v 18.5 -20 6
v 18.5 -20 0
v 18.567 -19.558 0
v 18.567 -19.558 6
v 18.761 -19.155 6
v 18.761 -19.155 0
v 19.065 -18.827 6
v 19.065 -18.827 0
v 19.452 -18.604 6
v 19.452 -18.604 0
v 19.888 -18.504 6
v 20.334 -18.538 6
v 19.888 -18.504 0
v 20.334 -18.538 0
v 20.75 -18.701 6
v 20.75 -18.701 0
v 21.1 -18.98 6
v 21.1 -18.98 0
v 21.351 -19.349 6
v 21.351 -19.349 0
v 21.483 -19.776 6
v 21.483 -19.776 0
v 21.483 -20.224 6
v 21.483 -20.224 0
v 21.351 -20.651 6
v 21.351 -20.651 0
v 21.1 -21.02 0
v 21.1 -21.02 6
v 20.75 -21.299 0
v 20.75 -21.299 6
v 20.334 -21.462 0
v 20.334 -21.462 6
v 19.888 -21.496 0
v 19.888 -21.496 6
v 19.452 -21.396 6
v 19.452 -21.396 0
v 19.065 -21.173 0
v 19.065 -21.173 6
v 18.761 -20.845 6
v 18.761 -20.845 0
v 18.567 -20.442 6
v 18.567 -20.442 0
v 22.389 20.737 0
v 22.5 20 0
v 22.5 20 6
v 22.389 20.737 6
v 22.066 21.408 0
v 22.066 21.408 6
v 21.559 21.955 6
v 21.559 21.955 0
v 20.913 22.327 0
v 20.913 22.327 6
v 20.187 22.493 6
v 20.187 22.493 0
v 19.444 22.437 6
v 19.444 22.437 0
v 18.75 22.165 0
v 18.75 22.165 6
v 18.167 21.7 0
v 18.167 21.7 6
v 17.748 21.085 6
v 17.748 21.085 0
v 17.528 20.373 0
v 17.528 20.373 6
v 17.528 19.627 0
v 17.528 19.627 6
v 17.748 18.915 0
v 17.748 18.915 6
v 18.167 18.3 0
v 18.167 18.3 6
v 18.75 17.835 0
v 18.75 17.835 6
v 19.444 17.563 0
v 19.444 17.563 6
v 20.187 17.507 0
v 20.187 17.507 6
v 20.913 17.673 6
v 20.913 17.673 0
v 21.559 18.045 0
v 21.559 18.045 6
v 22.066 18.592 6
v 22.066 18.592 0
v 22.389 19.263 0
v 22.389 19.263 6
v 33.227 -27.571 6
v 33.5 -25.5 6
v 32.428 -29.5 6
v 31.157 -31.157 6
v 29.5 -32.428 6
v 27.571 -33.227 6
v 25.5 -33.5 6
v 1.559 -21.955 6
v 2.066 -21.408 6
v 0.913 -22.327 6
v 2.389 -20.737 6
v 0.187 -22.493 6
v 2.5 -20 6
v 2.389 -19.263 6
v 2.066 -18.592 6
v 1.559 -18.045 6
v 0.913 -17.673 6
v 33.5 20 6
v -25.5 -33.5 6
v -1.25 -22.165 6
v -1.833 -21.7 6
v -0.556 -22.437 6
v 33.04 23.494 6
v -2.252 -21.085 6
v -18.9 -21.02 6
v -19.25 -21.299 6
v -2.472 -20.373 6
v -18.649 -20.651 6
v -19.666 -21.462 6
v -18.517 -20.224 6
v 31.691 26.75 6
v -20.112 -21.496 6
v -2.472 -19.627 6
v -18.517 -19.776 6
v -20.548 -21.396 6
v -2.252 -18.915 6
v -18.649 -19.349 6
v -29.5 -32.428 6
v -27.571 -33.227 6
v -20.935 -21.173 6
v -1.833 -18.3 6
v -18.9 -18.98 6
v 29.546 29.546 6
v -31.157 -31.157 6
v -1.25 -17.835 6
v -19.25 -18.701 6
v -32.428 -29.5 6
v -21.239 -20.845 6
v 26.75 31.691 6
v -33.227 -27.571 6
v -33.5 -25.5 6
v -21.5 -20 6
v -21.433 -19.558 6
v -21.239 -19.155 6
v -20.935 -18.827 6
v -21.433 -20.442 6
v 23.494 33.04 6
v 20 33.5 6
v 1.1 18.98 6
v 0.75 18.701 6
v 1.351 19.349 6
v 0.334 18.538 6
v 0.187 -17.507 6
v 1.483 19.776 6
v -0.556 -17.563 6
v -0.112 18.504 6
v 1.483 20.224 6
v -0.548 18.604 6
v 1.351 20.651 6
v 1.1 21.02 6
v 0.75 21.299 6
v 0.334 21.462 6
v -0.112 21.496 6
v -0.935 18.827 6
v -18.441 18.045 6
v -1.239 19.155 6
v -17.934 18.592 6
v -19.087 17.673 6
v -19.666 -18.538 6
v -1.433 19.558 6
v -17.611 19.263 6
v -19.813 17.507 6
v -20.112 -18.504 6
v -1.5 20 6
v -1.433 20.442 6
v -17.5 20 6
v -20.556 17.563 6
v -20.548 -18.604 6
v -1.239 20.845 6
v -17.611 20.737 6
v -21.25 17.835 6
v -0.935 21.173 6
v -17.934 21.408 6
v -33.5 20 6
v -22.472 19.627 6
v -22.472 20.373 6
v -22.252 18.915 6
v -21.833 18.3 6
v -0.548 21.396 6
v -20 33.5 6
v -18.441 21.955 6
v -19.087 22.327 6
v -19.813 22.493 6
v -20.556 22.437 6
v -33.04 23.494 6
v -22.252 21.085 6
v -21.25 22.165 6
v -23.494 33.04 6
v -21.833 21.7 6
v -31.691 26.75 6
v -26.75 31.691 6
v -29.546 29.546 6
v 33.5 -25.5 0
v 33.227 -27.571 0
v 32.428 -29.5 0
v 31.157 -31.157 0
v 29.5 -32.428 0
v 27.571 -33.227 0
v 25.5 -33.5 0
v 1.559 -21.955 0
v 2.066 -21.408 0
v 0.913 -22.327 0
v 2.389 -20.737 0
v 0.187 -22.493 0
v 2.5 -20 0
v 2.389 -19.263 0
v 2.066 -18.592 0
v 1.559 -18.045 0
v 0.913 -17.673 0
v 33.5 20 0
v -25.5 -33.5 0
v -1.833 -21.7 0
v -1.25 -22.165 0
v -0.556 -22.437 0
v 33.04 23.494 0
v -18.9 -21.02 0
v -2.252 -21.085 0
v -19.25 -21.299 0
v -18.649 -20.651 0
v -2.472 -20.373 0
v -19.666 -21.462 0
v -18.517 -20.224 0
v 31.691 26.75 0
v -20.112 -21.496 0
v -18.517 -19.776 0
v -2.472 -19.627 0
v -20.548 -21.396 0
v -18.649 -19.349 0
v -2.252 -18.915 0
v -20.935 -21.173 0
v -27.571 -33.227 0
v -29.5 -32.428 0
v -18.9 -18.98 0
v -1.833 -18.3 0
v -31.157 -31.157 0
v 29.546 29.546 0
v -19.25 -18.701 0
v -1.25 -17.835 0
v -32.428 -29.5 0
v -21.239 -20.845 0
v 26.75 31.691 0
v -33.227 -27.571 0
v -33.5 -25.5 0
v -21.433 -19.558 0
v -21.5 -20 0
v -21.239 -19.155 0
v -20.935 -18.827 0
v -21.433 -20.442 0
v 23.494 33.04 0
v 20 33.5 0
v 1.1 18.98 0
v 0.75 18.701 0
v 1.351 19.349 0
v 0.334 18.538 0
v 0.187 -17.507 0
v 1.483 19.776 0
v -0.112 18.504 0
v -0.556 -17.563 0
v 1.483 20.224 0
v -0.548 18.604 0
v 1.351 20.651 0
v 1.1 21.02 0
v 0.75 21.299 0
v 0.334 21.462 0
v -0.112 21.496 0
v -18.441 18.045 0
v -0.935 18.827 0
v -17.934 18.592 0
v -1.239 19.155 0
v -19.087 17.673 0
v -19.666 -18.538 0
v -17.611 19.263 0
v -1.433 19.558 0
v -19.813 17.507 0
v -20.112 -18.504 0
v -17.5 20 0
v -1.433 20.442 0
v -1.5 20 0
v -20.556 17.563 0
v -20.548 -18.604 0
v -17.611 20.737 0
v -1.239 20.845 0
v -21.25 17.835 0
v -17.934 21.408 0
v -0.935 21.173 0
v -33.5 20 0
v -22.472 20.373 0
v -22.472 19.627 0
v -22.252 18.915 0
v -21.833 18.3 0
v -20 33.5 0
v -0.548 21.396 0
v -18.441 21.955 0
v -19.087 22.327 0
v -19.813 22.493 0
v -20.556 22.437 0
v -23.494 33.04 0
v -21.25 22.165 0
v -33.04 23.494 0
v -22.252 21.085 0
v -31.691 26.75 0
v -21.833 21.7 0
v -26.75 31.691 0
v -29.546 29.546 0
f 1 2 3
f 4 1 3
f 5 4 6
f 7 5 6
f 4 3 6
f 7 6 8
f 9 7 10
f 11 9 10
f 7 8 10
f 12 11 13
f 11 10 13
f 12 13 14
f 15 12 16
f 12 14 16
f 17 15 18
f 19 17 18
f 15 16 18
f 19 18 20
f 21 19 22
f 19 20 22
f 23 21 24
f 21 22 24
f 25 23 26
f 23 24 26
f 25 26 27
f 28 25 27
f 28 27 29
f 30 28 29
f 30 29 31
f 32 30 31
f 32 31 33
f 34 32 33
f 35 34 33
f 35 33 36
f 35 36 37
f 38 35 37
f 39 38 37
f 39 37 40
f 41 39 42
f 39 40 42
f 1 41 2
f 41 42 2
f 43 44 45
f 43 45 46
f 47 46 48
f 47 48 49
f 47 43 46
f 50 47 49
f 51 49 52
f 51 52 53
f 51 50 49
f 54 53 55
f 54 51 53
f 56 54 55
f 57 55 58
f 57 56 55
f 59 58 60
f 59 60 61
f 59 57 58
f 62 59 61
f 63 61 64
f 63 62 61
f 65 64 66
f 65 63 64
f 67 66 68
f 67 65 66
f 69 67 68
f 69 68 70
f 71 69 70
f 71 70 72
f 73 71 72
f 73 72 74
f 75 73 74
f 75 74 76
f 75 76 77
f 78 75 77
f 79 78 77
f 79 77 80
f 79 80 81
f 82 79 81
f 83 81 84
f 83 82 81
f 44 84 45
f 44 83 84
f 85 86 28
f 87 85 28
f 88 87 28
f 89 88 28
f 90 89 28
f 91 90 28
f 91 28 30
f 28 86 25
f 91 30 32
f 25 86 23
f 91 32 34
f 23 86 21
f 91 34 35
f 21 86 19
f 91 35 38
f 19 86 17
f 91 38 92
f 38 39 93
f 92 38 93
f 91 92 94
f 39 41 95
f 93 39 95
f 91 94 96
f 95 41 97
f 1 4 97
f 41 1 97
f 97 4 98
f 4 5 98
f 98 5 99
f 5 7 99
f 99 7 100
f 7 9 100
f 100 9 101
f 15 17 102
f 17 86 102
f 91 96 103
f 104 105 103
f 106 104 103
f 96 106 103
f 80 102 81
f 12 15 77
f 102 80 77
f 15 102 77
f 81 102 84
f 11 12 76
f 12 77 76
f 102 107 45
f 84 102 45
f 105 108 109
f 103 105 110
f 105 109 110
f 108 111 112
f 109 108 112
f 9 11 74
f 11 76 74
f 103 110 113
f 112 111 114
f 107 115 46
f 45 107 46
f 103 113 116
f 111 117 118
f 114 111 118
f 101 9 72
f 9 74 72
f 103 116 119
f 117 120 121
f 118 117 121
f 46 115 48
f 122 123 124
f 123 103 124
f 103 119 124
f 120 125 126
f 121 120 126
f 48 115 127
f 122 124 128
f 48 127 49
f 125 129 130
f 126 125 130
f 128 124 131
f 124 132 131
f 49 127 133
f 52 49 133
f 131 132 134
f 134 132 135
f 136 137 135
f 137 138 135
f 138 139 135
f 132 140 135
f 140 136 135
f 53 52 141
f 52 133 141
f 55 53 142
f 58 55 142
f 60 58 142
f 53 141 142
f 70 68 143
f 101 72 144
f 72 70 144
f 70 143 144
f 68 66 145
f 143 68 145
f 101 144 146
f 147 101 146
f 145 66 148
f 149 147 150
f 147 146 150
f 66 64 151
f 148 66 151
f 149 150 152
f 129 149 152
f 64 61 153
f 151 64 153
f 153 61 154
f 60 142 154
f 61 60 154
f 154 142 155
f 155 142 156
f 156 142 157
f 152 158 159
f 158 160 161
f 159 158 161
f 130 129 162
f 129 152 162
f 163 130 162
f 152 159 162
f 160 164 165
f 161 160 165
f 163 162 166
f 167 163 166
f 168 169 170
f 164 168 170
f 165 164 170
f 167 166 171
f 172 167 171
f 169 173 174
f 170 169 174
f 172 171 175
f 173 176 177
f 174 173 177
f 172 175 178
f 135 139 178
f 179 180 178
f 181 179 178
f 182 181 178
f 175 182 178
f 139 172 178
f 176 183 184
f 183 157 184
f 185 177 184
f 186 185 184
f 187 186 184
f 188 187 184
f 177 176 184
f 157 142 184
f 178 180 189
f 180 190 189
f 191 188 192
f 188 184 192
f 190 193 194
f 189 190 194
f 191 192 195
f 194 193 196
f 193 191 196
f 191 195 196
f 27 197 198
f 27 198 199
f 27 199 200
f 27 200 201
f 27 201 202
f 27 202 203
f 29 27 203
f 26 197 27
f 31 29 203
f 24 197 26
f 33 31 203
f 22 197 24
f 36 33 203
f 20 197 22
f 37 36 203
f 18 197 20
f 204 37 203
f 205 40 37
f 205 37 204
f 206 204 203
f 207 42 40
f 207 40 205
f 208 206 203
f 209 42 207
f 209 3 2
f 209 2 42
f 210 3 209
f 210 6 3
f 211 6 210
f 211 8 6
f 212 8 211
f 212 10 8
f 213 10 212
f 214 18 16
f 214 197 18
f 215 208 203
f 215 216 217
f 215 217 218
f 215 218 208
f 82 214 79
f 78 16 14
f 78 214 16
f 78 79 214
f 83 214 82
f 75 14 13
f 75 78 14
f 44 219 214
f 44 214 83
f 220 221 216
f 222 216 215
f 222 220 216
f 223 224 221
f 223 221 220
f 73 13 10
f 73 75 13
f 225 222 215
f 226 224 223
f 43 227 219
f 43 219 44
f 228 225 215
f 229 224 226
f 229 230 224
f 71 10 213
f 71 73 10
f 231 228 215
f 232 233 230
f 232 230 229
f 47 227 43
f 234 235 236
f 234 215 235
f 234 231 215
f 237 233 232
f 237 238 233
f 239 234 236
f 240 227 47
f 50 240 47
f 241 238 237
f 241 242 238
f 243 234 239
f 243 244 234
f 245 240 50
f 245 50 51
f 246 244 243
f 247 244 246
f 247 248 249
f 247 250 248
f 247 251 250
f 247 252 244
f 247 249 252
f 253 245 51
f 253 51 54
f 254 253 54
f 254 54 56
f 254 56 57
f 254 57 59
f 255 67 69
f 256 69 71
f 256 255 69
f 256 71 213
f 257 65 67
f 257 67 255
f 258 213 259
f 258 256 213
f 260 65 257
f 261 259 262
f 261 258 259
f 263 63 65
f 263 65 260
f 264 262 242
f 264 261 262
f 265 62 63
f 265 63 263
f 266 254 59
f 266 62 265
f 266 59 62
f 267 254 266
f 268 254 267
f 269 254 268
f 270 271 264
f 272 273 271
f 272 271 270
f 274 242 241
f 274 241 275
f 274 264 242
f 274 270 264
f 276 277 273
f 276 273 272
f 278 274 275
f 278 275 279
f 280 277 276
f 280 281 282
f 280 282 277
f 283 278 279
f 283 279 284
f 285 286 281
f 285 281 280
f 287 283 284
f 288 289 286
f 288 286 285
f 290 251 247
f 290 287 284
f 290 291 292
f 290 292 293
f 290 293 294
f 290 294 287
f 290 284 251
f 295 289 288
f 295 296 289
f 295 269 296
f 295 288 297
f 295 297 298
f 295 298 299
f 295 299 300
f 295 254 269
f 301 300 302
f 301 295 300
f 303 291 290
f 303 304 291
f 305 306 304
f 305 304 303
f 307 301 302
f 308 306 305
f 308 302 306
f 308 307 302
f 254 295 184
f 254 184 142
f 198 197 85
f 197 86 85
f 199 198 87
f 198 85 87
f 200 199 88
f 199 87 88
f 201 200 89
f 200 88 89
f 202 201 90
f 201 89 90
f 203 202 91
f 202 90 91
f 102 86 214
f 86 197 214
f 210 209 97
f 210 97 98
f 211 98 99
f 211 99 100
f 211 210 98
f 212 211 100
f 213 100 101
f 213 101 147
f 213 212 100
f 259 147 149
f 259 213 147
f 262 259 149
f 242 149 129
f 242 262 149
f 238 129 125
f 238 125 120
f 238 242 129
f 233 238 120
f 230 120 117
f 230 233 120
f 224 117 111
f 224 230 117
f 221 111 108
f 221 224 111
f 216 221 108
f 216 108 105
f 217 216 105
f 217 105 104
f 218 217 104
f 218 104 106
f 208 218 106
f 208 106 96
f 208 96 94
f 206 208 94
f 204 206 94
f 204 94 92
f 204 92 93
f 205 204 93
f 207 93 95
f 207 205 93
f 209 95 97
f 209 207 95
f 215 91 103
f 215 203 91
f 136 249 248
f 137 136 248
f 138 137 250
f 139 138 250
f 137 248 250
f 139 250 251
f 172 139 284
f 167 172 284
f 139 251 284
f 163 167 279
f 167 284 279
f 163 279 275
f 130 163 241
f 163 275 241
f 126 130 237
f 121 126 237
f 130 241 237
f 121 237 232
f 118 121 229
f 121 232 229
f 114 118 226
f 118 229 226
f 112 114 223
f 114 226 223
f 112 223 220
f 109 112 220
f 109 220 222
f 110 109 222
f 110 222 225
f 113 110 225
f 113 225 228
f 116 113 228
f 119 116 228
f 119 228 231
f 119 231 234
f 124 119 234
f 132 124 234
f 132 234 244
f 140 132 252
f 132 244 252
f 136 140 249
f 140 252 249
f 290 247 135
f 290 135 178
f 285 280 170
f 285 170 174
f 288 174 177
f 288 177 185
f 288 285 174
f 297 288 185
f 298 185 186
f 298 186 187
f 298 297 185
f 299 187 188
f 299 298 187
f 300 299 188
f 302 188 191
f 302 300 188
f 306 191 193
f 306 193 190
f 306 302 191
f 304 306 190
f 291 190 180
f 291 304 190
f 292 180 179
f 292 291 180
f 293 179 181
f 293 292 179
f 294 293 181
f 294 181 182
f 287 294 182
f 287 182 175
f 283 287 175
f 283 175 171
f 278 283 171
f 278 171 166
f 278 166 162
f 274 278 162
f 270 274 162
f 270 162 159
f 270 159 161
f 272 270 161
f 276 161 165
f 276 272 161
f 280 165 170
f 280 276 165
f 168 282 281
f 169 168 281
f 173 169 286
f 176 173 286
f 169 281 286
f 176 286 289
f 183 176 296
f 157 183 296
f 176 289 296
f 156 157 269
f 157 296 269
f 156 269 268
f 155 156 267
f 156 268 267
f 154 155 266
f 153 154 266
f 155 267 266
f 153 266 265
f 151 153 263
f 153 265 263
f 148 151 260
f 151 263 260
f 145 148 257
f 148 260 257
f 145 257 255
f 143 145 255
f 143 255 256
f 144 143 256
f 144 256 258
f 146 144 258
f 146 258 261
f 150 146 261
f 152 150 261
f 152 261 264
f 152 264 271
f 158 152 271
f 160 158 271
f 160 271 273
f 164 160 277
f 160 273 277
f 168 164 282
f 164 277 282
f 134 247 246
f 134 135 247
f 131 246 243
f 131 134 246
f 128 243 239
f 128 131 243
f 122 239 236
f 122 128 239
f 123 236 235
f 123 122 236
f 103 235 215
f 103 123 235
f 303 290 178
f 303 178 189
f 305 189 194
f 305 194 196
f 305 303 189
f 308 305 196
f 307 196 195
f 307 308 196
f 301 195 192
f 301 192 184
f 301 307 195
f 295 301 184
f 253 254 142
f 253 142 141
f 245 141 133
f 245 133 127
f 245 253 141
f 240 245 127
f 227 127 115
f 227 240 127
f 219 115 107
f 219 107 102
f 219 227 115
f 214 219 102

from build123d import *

# Parameters (mm, degrees)
ESBO_O1_R                = 2.5
RESSALTO_EXTRUS_O1_DEPTH = 6
ESBO_O2_W                = 13.5
ESBO_O2_H                = 13.5
RESSALTO_EXTRUS_O2_DEPTH = 6
FILETE1_R                = 8
ESBO_O3_R                = 1.5
CORTE_EXTRUS_O1_DEPTH    = 6


with BuildPart() as part:
    # Esboço1 → Ressalto-extrusão1 (new body)
    with BuildSketch(Plane.XY):
        with BuildLine():
            Line((-20, 33.5), (20, 33.5))
            ThreePointArc((20, 33.5), (29.545941546, 29.545941546), (33.5, 20))
            Line((33.5, 20), (33.5, -20))
            ThreePointArc((33.5, -20), (29.545941546, -29.545941546), (20, -33.5))
            Line((20, -33.5), (-20, -33.5))
            ThreePointArc((-20, -33.5), (-29.545941546, -29.545941546), (-33.5, -20))
            Line((-33.5, -20), (-33.5, 20))
            ThreePointArc((-33.5, 20), (-29.545941546, 29.545941546), (-20, 33.5))
        make_face()
        with Locations((-20, 20)):
            Circle(ESBO_O1_R, mode=Mode.SUBTRACT)
        with Locations((20, 20)):
            Circle(ESBO_O1_R, mode=Mode.SUBTRACT)
        with Locations((0, -20)):
            Circle(ESBO_O1_R, mode=Mode.SUBTRACT)
    extrude(amount=RESSALTO_EXTRUS_O1_DEPTH)

    # Esboço2 → Ressalto-extrusão2 (add)
    with BuildSketch(Plane(origin=(0, 0, 0), x_dir=(-1, 0, 0), z_dir=(0, 0, -1))):
        with Locations((-26.75, -26.75)):
            Rectangle(ESBO_O2_W, ESBO_O2_H)
        with Locations((26.75, -26.75)):
            Rectangle(ESBO_O2_W, ESBO_O2_H)
    extrude(amount=-RESSALTO_EXTRUS_O2_DEPTH)

    # Filete1
    filete1_edges = [part.edges().sort_by_distance(p)[0] for p in [
        (33.5, -33.5, 3),
        (-33.5, -33.5, 3),
    ]]
    fillet(filete1_edges, radius=FILETE1_R)

    # Esboço3 → Corte-extrusão1 (cut)
    with BuildSketch(Plane(origin=(0, 0, 0), x_dir=(-1, 0, 0), z_dir=(0, 0, -1))):
        with Locations((0, 20)):
            Circle(ESBO_O3_R)
        with Locations((20, -20)):
            Circle(ESBO_O3_R)
        with Locations((-20, -20)):
            Circle(ESBO_O3_R)
    extrude(amount=-CORTE_EXTRUS_O1_DEPTH, mode=Mode.SUBTRACT)


solid = part.part
